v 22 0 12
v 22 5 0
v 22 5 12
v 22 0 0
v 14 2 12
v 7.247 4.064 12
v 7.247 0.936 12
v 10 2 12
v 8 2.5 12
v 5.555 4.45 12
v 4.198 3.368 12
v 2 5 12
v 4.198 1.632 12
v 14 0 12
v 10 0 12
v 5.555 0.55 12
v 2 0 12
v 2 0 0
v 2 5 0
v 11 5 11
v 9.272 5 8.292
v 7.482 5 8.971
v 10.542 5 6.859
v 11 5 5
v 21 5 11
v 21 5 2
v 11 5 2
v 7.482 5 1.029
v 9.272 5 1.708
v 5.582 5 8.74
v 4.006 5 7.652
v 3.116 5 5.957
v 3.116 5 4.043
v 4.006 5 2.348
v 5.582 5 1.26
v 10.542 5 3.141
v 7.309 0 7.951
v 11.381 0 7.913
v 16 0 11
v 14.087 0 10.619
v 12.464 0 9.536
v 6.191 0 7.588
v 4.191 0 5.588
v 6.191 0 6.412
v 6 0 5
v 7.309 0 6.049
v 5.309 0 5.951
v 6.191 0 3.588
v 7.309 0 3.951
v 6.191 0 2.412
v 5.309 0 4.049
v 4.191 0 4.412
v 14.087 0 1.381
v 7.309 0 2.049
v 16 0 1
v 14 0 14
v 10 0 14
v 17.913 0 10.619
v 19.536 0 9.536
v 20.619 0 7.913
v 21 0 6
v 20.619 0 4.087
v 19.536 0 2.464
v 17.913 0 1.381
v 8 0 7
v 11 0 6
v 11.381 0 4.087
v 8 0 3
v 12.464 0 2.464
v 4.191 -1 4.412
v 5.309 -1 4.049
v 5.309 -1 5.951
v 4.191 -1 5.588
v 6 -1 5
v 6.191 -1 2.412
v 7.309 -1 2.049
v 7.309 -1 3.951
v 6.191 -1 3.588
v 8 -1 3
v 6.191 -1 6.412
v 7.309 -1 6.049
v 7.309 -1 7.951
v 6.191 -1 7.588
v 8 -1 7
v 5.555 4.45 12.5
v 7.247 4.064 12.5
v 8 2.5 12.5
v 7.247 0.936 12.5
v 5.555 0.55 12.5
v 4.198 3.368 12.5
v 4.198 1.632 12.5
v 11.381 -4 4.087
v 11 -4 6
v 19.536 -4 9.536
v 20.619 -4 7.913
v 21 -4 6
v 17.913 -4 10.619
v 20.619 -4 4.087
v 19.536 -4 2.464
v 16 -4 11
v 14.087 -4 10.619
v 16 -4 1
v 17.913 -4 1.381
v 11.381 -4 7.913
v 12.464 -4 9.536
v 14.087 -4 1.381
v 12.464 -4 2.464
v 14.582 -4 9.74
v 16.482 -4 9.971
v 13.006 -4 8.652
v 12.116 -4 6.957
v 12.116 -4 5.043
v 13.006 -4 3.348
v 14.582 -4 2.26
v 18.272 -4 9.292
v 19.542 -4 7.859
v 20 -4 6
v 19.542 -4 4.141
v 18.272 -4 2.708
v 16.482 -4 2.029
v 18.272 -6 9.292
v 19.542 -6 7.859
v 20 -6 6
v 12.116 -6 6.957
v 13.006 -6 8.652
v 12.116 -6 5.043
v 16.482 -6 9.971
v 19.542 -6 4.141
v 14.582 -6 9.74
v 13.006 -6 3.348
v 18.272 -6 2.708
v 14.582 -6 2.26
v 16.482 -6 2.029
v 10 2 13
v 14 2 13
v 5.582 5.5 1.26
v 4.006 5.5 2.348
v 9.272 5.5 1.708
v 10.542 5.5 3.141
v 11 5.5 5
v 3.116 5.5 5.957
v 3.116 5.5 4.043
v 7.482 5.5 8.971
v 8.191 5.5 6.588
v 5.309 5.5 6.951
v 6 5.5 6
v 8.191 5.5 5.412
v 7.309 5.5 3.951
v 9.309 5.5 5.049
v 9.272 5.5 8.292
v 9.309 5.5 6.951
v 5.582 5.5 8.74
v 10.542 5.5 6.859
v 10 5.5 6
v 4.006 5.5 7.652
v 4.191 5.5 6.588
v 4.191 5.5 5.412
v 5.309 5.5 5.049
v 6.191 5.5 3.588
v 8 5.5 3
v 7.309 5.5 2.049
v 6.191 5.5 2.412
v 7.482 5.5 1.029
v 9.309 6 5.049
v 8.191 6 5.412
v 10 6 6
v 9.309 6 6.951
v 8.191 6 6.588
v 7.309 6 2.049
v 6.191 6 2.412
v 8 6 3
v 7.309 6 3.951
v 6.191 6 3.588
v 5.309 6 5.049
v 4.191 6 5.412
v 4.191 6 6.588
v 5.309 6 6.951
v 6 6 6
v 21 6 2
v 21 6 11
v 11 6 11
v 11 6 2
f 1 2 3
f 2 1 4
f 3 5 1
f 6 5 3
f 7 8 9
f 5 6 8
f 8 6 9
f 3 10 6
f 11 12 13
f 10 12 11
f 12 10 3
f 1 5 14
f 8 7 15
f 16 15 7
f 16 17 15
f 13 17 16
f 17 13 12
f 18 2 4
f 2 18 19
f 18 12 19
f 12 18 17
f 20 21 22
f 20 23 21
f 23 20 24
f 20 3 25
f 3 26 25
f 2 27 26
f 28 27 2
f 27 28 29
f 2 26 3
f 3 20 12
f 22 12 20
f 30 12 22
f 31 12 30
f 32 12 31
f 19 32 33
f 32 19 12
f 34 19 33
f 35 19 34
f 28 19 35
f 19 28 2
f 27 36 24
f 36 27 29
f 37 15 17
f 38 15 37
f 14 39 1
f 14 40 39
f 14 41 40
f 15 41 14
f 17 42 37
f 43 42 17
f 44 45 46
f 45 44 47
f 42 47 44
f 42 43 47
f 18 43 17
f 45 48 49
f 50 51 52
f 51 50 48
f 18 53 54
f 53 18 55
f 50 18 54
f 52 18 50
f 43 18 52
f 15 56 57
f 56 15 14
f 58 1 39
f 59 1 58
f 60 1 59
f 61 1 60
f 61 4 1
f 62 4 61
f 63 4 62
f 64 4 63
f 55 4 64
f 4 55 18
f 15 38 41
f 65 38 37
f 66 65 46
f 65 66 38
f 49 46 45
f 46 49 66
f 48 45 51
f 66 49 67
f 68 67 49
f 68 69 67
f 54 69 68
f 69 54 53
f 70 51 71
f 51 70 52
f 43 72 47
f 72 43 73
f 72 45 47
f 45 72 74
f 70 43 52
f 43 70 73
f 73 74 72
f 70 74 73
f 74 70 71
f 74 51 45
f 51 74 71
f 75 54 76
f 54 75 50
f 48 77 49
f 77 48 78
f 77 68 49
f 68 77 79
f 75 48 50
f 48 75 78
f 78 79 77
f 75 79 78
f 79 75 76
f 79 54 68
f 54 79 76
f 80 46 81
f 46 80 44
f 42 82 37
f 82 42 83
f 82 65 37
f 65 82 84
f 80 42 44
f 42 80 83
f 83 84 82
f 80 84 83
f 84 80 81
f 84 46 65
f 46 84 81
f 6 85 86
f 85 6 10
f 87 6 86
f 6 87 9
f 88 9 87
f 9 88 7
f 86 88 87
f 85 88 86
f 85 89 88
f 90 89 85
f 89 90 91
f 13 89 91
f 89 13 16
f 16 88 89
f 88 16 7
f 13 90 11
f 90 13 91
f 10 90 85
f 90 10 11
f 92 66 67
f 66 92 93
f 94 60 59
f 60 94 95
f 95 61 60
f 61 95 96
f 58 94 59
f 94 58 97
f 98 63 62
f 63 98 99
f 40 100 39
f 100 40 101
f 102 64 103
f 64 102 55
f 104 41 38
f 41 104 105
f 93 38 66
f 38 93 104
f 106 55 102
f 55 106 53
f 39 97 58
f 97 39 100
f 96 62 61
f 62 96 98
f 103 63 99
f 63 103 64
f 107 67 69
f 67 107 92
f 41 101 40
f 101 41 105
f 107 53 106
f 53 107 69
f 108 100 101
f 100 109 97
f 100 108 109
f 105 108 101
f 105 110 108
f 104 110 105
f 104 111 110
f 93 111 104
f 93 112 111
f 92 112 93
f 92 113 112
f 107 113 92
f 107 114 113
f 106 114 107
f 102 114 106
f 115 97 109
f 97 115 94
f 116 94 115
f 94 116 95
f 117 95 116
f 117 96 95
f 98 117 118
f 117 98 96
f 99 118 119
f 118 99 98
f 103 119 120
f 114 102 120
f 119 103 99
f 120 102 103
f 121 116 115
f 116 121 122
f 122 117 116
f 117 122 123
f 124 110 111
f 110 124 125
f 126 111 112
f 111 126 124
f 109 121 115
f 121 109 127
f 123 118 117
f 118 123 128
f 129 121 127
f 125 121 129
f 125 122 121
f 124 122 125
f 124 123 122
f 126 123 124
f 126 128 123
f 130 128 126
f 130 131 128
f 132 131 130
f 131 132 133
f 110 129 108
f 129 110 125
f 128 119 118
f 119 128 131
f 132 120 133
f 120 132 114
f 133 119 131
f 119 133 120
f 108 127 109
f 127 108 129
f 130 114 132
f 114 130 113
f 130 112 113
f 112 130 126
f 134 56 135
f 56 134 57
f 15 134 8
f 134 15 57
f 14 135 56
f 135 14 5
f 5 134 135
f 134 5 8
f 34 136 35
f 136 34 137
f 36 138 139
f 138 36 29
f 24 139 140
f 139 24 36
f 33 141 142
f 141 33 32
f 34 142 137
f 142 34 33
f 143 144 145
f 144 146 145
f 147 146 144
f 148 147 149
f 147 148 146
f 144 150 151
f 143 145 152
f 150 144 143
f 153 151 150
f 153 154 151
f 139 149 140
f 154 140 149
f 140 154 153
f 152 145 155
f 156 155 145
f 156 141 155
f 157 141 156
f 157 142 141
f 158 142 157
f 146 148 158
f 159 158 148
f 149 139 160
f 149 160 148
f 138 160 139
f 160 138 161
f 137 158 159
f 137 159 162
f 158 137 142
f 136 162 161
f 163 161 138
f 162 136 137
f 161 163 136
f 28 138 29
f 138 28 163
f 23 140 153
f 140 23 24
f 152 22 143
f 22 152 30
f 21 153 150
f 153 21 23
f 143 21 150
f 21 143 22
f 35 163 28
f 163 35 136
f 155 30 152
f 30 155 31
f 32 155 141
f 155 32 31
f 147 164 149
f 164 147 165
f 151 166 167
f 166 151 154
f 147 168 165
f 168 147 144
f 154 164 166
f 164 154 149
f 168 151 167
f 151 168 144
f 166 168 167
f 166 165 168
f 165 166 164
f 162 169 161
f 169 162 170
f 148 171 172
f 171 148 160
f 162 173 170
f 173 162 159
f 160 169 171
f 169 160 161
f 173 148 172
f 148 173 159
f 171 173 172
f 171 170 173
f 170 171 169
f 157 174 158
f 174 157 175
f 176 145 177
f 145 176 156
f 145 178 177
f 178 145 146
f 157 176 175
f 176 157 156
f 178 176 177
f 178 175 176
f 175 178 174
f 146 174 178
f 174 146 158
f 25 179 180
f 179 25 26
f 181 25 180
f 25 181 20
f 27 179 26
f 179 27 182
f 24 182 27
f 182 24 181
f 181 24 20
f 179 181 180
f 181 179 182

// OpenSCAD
    translate([2,0,0])
        cube(size=[20,5,12]);
      
    translate([2,0,0])
            cube(size=[20,0,12]);
      
    translate([5,0,5])
        rotate([90,0,0])
            cylinder(1);
            
    translate([7,0,3])
        rotate([90,0,0])
            cylinder(1);

    translate([7,0,7])
        rotate([90,0,0])
            cylinder(1);
            
    translate([6,2.5,12])
        cylinder(r=2,r2=2, h=.5);
     
    rotate([90,0,0])
        translate([16,6,0])
            cylinder(4,5,5);
            
    rotate([90,0,0])
        translate([16,6,3])
            cylinder(3,4,4);
        
    translate([10,0,14])
        rotate([0,90,0])
          linear_extrude(height=4, slices=10)
          
  polygon(points=[ [0,0], [6,0], [5,2], [1,2]]);
  
    translate([7,5,5])
        rotate([270,0,0])
            cylinder(r=4,r2=4,h=.5);
        
    translate([9,6,6])
        rotate([90,0,0])
              cylinder(1);
              
      translate([7,6,3])
        rotate([90,0,0])
              cylinder(1);
              
      translate([5,6,6])
        rotate([90,0,0])
              cylinder(1);
              
     translate([11,1,2])
        cube(size=[10,5,9]);
       
